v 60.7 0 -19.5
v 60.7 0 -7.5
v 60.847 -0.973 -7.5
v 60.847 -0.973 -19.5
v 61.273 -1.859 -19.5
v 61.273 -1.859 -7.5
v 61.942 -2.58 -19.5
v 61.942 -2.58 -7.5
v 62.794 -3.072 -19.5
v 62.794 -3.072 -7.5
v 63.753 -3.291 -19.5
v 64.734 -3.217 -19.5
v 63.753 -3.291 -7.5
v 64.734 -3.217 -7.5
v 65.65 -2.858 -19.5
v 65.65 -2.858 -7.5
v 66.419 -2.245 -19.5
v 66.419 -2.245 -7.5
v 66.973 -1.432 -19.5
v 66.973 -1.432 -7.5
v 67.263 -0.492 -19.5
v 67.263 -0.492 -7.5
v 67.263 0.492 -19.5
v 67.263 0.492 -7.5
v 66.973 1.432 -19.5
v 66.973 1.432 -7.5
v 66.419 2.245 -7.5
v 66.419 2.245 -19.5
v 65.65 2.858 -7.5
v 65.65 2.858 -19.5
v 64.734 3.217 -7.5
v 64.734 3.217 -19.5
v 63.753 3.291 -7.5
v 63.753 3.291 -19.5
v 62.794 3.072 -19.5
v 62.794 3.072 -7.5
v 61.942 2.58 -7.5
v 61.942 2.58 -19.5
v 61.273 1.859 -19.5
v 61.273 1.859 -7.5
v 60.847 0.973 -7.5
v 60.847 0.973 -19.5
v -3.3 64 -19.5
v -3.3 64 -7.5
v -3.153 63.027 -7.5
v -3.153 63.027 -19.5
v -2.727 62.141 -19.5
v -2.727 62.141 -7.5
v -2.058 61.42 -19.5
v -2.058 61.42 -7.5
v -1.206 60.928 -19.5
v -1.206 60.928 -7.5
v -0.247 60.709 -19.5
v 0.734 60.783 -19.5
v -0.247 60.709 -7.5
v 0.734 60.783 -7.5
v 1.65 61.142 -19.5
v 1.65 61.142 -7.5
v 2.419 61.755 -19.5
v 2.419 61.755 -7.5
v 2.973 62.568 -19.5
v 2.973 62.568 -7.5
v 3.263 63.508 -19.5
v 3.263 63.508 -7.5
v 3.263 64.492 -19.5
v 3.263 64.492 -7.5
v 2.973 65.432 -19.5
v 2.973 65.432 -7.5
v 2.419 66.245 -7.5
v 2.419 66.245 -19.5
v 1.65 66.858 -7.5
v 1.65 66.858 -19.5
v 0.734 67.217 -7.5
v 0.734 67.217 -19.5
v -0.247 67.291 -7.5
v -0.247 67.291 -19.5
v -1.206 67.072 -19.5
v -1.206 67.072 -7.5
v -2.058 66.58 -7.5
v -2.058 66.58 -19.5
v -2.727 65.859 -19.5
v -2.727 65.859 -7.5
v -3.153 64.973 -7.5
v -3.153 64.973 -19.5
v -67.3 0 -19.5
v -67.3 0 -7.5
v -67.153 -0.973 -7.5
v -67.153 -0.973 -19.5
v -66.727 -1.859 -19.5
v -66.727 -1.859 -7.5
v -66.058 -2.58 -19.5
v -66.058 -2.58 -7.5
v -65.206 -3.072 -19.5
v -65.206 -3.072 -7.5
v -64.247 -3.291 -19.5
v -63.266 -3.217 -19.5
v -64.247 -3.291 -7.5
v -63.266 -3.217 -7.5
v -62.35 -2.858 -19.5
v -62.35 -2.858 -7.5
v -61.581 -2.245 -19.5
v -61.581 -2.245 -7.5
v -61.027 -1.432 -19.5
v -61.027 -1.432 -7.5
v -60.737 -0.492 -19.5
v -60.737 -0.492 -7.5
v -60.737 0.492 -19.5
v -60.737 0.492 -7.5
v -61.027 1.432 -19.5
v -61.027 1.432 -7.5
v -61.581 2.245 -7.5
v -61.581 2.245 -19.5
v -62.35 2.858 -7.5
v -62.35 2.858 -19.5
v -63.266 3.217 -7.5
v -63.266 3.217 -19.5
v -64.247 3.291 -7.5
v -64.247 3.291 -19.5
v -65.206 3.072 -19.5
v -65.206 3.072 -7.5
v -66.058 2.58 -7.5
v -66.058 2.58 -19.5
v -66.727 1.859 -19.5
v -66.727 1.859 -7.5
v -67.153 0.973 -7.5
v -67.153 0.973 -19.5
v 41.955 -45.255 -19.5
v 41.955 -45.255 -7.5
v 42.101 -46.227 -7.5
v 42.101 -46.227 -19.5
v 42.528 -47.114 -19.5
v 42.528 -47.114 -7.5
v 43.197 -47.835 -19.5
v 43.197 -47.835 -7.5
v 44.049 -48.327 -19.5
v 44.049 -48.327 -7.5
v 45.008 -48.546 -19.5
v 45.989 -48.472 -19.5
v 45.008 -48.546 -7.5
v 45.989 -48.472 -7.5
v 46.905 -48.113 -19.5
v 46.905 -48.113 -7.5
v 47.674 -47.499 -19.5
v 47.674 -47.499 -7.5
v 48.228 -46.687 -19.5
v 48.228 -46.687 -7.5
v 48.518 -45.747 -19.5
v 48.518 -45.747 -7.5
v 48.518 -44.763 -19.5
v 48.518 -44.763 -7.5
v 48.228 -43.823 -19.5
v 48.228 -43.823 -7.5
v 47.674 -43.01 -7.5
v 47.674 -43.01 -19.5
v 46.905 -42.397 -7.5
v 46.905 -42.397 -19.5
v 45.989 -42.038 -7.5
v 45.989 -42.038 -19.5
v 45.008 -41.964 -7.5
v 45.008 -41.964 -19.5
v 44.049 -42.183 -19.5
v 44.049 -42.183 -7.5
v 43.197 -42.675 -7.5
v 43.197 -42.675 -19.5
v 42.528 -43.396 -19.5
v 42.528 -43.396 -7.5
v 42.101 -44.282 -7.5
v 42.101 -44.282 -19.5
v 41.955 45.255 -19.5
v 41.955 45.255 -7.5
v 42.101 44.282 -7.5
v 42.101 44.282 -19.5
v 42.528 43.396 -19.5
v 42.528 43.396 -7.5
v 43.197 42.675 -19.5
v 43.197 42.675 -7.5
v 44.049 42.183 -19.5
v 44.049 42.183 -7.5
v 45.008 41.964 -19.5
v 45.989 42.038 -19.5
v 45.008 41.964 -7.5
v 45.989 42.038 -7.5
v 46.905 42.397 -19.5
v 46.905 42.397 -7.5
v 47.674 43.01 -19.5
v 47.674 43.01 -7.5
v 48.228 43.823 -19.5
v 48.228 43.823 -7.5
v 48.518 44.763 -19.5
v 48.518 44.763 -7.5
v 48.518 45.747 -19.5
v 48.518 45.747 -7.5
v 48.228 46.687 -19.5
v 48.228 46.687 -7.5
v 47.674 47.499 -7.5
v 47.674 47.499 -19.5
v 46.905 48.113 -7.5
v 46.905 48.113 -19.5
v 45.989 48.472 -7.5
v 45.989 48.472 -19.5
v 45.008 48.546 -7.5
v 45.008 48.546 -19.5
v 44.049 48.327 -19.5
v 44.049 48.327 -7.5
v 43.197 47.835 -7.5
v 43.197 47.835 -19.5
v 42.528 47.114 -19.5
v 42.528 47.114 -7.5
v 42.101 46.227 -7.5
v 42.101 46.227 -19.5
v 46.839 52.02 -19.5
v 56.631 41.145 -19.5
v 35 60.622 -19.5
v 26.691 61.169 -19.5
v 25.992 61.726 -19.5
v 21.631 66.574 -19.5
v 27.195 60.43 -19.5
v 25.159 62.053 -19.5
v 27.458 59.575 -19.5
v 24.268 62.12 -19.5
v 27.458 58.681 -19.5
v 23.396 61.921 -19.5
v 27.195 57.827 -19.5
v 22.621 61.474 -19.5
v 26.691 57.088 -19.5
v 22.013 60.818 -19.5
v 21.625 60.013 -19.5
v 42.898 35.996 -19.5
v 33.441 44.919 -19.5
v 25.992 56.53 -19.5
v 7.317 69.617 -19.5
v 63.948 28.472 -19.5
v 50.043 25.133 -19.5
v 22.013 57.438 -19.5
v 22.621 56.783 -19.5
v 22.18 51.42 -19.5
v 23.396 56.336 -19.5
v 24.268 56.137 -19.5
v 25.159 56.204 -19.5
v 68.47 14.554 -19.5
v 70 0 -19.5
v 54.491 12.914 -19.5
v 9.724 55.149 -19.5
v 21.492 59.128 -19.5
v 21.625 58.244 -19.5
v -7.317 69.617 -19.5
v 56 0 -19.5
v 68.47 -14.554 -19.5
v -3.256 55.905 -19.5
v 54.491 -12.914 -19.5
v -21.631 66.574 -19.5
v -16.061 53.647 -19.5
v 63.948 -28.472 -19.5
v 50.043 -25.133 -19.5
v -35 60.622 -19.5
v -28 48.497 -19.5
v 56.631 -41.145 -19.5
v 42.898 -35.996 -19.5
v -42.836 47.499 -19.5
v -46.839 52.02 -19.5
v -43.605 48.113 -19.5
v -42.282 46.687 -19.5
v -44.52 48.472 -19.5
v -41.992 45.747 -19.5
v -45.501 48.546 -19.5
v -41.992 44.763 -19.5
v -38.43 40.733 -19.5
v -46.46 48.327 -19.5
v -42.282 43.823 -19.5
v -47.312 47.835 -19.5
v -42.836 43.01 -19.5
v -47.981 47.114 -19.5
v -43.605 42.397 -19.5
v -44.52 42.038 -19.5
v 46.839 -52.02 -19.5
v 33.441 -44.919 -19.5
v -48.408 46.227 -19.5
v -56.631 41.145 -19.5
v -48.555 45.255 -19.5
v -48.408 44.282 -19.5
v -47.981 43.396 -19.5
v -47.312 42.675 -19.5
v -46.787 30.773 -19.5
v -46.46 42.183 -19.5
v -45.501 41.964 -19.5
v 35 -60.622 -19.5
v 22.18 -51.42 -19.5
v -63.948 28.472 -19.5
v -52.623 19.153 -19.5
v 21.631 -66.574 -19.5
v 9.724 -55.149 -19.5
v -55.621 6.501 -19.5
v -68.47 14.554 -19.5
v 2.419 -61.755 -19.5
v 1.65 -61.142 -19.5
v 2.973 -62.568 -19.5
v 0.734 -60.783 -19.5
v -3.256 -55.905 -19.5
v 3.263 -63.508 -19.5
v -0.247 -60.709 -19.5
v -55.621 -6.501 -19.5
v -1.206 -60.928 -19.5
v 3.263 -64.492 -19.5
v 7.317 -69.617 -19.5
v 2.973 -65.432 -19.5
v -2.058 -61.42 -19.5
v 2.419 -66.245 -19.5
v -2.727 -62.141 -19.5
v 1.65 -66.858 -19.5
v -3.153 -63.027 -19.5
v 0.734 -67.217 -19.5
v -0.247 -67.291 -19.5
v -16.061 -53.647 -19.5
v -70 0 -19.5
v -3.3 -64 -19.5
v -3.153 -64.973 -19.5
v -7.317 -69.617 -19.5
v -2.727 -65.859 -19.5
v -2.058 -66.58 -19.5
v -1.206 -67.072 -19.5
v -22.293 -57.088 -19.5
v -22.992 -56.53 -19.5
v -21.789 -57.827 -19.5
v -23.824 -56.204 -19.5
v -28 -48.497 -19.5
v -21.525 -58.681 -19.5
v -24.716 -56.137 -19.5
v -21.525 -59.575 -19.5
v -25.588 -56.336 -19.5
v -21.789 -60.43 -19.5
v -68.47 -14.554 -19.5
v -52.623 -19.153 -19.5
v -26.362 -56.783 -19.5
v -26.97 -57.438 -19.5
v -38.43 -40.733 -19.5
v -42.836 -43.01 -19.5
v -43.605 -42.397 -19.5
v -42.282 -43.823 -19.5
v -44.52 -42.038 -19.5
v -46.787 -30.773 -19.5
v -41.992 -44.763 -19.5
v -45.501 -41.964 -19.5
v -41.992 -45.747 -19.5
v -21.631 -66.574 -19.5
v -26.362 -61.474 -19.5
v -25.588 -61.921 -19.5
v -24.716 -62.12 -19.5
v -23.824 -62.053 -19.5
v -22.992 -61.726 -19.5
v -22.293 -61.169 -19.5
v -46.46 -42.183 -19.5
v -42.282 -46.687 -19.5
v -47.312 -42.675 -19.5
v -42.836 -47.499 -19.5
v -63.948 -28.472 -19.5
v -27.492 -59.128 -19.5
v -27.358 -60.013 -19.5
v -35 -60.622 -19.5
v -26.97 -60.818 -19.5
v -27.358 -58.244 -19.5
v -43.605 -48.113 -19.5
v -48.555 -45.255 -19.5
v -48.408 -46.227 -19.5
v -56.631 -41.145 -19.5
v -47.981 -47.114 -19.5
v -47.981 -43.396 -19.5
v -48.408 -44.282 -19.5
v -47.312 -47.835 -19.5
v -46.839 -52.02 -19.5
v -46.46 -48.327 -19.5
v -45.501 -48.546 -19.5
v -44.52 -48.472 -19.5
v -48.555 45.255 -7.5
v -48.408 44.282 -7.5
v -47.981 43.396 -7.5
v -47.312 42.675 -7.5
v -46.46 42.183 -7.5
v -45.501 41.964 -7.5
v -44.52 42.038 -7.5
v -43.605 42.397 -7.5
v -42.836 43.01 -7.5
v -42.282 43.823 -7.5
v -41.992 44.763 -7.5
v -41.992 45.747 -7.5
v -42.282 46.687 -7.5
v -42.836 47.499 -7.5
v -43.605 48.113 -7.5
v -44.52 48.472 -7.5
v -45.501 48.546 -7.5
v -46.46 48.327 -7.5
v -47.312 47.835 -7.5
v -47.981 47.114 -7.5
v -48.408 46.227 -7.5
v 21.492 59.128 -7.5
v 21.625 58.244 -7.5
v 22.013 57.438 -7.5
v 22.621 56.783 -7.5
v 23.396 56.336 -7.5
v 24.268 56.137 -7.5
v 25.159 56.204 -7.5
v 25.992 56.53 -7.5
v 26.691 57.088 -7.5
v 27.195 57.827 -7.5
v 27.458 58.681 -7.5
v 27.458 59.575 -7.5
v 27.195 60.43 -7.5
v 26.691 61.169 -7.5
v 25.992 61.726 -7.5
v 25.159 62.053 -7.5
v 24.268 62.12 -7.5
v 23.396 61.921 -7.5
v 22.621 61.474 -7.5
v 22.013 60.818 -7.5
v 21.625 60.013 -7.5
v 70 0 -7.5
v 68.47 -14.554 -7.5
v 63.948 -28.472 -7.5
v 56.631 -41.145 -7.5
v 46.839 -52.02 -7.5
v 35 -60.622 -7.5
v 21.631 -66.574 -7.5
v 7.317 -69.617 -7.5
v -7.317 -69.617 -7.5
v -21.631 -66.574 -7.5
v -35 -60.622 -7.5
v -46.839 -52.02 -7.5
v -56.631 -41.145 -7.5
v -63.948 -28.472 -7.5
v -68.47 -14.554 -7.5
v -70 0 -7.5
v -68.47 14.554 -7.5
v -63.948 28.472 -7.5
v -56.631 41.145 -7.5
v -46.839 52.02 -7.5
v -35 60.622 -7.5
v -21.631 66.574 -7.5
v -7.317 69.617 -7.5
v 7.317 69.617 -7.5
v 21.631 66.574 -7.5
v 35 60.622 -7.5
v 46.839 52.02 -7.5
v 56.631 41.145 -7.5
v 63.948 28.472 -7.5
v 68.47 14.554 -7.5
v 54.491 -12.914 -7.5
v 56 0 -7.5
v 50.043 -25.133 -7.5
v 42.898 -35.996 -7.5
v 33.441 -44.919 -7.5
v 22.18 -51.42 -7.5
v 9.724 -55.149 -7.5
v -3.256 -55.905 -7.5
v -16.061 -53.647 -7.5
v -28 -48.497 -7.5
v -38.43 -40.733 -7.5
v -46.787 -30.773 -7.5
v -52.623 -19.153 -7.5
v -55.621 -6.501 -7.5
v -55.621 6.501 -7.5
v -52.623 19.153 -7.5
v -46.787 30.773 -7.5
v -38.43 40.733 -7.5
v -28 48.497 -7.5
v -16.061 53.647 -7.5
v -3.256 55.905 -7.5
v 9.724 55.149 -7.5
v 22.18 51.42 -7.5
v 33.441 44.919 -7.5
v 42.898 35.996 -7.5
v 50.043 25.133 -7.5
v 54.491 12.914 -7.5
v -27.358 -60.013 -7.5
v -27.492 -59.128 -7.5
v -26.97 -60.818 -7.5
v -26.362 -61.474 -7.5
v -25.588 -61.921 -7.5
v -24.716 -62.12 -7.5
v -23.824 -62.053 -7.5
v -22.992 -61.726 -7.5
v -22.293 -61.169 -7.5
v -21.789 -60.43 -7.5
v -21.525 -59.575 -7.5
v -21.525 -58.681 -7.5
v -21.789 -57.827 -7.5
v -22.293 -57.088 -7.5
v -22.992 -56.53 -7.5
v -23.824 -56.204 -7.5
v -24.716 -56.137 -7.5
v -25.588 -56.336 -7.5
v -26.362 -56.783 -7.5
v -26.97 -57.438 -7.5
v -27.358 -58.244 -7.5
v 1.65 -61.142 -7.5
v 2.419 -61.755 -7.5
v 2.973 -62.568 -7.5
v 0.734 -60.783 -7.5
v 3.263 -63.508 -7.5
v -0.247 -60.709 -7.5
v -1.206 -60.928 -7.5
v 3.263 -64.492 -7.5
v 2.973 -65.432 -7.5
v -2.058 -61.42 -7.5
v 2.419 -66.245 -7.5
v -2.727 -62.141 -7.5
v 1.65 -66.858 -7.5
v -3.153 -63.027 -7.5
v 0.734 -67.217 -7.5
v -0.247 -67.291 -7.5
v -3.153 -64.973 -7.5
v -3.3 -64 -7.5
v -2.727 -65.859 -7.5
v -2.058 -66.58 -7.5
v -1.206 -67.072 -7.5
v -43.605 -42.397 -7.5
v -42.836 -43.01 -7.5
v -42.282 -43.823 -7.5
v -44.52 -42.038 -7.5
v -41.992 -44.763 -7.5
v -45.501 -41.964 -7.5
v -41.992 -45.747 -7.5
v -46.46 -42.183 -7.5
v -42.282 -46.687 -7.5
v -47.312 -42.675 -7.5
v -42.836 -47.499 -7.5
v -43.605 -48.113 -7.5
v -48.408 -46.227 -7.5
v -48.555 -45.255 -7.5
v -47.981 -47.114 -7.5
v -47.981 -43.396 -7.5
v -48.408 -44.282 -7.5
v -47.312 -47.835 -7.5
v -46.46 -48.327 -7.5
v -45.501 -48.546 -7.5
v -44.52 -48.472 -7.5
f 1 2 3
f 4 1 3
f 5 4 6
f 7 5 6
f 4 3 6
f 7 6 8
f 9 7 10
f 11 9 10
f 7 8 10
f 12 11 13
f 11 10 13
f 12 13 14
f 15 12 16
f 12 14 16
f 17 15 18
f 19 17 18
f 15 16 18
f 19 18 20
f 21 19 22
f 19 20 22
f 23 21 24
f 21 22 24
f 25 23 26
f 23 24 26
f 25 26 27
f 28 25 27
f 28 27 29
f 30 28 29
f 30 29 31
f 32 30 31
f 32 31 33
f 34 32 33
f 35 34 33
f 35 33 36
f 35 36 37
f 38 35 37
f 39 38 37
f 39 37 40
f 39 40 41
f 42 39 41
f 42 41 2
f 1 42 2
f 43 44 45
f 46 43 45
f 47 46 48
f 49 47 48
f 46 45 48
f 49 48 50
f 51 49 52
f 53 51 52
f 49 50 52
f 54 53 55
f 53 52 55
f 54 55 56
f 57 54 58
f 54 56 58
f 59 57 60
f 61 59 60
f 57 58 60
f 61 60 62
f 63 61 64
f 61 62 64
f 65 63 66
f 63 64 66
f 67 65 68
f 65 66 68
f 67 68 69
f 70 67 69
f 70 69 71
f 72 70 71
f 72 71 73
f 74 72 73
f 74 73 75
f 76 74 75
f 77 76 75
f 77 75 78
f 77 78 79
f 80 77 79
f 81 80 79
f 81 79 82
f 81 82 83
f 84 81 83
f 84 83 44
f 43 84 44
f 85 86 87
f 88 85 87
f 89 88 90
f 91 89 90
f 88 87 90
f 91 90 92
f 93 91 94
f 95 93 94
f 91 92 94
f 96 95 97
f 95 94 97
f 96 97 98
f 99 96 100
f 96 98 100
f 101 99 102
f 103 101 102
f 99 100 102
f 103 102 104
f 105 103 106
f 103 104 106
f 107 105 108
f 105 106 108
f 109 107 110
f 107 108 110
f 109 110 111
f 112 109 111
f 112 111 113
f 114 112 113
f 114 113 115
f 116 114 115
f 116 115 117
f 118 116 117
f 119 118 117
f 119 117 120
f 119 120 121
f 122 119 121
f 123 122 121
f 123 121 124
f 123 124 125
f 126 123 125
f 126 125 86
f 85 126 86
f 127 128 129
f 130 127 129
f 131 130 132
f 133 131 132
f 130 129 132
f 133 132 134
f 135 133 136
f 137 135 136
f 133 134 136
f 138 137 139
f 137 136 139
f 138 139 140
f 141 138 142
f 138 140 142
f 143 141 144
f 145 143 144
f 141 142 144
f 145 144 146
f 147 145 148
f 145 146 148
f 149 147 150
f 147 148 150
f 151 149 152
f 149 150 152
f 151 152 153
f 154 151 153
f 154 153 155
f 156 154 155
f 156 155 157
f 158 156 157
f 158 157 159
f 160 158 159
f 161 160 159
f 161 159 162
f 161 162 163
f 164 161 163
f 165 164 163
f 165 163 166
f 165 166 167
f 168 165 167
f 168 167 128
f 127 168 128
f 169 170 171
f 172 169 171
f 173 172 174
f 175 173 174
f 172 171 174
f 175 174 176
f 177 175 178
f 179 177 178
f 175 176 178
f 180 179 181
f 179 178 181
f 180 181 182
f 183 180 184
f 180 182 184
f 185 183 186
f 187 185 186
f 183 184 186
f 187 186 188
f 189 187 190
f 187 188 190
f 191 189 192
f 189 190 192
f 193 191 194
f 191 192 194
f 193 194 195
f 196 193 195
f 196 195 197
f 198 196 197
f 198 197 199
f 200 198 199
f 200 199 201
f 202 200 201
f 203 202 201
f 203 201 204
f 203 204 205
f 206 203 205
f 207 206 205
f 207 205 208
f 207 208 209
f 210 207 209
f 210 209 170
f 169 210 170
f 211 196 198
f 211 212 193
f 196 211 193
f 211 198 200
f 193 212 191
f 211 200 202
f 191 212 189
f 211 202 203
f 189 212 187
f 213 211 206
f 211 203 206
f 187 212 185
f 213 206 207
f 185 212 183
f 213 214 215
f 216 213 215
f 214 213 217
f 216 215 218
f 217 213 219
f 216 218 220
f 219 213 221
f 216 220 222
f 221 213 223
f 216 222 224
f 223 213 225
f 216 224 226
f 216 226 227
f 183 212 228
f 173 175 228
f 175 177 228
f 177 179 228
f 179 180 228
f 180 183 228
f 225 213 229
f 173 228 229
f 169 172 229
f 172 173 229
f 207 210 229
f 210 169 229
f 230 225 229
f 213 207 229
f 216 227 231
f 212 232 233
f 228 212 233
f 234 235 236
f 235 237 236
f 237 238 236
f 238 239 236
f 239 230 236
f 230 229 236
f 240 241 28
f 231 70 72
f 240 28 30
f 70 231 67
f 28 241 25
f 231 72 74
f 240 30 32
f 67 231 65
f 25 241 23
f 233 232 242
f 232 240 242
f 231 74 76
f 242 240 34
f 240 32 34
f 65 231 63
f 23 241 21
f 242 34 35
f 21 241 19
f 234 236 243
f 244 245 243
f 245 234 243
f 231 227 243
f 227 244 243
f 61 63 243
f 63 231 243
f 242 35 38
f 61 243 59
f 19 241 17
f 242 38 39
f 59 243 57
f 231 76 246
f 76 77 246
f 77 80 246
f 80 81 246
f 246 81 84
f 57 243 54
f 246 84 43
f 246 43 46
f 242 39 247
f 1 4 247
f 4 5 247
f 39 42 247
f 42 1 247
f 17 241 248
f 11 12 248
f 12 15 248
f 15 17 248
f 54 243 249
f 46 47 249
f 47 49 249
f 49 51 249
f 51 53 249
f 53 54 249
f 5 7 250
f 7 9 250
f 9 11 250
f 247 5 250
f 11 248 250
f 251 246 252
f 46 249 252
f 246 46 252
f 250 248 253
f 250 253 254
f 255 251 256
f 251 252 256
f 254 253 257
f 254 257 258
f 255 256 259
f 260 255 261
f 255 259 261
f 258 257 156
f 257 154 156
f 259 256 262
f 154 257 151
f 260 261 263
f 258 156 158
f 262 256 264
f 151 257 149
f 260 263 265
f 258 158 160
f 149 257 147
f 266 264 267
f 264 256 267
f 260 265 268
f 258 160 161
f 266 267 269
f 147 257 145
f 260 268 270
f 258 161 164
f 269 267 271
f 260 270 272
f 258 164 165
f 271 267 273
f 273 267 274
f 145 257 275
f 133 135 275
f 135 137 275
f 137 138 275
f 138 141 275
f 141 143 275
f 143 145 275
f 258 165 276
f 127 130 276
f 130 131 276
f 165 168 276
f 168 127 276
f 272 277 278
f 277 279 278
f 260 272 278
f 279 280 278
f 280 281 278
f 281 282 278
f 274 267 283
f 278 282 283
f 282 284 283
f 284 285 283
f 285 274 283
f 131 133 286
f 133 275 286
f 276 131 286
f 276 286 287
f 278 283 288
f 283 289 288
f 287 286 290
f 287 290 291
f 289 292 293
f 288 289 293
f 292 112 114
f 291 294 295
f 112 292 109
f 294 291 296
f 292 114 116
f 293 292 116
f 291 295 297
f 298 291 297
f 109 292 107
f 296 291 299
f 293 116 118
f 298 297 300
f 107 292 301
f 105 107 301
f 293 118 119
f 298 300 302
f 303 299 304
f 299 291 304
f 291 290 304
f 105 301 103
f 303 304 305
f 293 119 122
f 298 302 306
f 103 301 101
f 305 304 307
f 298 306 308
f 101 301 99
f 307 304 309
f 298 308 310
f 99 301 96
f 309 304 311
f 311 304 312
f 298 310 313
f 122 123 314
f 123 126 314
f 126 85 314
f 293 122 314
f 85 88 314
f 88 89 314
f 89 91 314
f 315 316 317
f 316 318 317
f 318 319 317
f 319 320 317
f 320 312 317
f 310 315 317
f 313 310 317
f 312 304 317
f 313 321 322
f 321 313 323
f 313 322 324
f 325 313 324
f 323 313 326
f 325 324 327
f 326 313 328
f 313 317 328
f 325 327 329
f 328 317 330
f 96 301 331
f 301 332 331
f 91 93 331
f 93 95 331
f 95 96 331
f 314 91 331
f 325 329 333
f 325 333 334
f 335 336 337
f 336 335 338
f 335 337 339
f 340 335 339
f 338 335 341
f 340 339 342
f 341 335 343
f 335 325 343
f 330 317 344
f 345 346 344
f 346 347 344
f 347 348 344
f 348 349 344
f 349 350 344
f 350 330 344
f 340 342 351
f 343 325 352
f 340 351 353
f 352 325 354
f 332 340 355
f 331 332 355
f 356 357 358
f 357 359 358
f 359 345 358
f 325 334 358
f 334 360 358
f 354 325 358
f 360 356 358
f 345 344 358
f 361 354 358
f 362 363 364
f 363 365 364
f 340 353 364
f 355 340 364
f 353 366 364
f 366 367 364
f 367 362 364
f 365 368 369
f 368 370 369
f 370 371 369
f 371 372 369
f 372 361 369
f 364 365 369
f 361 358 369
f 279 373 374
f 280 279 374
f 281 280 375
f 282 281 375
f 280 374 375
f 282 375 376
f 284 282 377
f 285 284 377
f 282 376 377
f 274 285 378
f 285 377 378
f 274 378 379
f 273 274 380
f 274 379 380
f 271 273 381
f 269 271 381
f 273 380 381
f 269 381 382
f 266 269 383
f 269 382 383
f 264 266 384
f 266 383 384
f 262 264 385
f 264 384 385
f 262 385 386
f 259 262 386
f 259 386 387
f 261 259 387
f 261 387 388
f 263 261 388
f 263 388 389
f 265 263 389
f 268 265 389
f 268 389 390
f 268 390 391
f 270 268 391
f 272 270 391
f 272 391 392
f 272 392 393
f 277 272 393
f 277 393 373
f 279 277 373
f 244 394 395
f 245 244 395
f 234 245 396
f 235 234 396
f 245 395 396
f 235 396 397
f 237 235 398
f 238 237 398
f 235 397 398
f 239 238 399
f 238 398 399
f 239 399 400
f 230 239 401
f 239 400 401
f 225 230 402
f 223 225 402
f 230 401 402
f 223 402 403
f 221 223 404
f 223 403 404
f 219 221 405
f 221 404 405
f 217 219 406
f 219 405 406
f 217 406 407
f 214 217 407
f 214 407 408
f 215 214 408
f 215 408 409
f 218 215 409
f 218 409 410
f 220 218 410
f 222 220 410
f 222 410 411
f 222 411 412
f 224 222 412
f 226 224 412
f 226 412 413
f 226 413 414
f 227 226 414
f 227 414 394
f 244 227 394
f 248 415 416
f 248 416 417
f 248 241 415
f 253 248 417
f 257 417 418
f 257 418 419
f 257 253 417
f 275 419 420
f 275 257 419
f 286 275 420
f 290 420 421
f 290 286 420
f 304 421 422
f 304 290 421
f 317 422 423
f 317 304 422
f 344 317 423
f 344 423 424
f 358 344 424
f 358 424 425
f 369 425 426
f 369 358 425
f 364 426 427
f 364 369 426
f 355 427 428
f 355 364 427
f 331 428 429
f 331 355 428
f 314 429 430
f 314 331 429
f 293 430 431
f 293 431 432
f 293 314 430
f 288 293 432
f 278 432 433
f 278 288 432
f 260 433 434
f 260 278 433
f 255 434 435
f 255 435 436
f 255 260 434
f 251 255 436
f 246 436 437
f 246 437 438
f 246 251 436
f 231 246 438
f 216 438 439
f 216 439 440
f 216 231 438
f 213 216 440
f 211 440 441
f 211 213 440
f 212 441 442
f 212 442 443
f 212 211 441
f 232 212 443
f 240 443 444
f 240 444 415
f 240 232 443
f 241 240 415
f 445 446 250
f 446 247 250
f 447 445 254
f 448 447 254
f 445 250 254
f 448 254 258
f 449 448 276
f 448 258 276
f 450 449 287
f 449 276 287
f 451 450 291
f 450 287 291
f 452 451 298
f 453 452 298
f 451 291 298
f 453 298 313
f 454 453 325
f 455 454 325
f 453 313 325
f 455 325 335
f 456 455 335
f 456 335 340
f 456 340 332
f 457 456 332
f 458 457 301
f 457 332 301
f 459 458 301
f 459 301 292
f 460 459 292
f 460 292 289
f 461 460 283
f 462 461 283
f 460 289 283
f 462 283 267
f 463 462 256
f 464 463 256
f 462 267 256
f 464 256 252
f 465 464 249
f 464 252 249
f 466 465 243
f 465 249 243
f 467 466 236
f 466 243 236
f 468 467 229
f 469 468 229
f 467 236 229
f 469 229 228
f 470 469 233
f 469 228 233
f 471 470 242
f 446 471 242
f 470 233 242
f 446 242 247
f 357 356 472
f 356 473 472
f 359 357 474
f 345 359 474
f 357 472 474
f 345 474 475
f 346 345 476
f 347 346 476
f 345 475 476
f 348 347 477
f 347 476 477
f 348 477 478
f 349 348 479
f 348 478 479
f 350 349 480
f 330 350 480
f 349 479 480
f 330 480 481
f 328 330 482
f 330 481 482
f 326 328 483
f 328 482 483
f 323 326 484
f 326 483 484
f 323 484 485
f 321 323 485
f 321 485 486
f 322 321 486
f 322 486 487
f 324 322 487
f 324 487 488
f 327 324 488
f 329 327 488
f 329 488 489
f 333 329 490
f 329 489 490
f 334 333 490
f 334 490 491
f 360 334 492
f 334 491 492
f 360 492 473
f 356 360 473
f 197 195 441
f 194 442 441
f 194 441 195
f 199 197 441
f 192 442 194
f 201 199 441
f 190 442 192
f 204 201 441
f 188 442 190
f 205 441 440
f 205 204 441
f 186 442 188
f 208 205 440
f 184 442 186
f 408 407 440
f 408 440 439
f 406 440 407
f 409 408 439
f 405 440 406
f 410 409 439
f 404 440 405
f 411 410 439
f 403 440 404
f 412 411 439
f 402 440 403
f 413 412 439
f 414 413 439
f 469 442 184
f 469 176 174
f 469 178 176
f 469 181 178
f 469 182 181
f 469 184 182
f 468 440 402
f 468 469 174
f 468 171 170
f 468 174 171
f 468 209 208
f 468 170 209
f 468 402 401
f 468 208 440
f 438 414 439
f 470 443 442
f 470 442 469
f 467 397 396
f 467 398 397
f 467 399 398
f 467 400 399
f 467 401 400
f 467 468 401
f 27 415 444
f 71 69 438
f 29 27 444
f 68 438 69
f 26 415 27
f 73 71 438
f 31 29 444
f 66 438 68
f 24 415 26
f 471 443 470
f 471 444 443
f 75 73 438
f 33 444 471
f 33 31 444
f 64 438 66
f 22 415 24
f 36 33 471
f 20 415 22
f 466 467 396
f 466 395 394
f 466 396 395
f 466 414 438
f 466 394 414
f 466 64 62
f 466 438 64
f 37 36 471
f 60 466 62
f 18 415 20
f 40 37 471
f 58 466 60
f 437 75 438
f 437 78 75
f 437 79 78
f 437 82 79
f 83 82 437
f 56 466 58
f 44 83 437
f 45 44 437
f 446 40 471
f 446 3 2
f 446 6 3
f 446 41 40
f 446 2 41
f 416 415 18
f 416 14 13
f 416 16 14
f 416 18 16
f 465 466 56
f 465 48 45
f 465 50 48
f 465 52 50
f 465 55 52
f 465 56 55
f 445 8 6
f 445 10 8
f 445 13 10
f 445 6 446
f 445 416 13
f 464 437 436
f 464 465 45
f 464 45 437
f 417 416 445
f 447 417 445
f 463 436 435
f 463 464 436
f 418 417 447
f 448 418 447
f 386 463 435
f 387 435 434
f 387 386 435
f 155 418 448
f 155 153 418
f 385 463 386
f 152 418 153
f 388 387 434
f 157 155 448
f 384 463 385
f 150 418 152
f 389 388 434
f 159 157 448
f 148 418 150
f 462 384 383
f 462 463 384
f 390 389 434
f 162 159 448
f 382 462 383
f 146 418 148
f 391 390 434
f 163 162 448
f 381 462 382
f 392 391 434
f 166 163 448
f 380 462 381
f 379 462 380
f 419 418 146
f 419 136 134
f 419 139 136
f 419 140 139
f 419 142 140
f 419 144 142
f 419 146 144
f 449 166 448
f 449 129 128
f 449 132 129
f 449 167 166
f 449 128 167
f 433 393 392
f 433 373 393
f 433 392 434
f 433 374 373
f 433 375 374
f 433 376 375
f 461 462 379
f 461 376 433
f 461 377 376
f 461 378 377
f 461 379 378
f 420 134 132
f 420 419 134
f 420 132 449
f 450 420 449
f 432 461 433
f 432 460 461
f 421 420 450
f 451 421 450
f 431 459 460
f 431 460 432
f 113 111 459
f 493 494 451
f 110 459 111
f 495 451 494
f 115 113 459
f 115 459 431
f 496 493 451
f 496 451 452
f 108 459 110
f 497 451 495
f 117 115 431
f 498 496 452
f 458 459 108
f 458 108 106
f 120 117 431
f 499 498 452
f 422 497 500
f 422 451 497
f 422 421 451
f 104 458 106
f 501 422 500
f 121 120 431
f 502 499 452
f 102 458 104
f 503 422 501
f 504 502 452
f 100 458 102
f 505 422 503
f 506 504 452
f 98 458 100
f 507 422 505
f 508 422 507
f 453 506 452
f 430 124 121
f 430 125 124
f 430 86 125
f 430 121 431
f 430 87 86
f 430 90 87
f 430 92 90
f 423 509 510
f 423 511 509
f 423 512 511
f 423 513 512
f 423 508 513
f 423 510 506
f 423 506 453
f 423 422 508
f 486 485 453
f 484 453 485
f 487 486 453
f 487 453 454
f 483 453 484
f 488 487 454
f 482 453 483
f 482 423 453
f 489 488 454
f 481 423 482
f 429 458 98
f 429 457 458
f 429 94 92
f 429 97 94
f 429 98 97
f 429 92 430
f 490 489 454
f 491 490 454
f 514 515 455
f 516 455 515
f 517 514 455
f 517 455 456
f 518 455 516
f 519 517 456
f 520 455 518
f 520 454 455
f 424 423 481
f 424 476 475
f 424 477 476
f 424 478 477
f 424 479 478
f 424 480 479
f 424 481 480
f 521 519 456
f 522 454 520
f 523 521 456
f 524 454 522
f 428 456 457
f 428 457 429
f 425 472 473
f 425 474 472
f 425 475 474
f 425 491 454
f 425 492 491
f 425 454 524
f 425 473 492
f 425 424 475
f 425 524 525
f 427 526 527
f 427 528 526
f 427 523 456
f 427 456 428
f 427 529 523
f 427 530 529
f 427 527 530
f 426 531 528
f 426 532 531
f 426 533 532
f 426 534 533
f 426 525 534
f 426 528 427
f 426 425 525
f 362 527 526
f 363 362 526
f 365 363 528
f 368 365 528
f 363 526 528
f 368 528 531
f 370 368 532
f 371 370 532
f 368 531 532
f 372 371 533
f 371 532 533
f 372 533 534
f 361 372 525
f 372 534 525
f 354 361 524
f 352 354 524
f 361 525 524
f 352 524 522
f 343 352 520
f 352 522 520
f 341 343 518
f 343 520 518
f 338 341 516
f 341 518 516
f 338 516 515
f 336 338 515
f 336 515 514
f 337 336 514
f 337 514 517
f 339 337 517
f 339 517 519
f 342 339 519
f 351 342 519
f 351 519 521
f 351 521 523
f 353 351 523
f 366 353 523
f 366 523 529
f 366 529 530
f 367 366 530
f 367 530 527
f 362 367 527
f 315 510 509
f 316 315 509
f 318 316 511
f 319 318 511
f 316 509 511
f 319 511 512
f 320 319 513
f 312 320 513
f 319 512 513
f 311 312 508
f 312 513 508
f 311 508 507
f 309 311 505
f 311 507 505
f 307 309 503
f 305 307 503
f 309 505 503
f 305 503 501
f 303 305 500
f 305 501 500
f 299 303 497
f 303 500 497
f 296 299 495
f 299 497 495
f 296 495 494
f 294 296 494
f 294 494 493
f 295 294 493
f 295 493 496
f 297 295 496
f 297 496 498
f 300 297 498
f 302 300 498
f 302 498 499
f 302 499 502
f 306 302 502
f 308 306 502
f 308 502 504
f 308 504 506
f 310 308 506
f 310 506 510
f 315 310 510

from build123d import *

# Parameters (mm, degrees)
SKETCH1_W                              = 14
SKETCH1_H                              = 12
SKETCH2_R                              = 3.3
SKETCH2_R_2                            = 3
CUT_8XTIE_D6_6_2XDOWEL_D6_PCD128_DEPTH = 150


with BuildPart() as part:
    # Sketch1 → REV_Interstage_Spacer (revolve)
    with BuildSketch(Plane(origin=(0, 0, 0), x_dir=(1, 0, 0), z_dir=(0, 1, 0))):
        with Locations((63, 13.5)):
            Rectangle(SKETCH1_W, SKETCH1_H)
    revolve(axis=Axis((0, 0, 150), (0, 0, -1)))

    # Sketch2 → CUT_8xTie_D6.6_2xDowel_D6_PCD128 (cut, symmetric)
    with BuildSketch(Plane.XY):
        with Locations(Location((64, 0, 0), (0, 0, 180))):
            Circle(SKETCH2_R)
        with Locations(Location((45.2548, 45.2548, 0), (0, 0, 180))):
            Circle(SKETCH2_R)
        with Locations(Location((0, 64, 0), (0, 0, 180))):
            Circle(SKETCH2_R)
        with Locations(Location((-45.2548, 45.2548, 0), (0, 0, 180))):
            Circle(SKETCH2_R)
        with Locations(Location((-64, 0, 0), (0, 0, 180))):
            Circle(SKETCH2_R)
        with Locations(Location((-45.2548, -45.2548, 0), (0, 0, 180))):
            Circle(SKETCH2_R)
        with Locations(Location((0, -64, 0), (0, 0, 180))):
            Circle(SKETCH2_R)
        with Locations(Location((45.2548, -45.2548, 0), (0, 0, 180))):
            Circle(SKETCH2_R)
        with Locations(Location((24.4917, 59.1283, 0), (0, 0, 180))):
            Circle(SKETCH2_R_2)
        with Locations(Location((-24.4917, -59.1283, 0), (0, 0, 180))):
            Circle(SKETCH2_R_2)
    extrude(amount=CUT_8XTIE_D6_6_2XDOWEL_D6_PCD128_DEPTH, both=True, mode=Mode.SUBTRACT)


solid = part.part
